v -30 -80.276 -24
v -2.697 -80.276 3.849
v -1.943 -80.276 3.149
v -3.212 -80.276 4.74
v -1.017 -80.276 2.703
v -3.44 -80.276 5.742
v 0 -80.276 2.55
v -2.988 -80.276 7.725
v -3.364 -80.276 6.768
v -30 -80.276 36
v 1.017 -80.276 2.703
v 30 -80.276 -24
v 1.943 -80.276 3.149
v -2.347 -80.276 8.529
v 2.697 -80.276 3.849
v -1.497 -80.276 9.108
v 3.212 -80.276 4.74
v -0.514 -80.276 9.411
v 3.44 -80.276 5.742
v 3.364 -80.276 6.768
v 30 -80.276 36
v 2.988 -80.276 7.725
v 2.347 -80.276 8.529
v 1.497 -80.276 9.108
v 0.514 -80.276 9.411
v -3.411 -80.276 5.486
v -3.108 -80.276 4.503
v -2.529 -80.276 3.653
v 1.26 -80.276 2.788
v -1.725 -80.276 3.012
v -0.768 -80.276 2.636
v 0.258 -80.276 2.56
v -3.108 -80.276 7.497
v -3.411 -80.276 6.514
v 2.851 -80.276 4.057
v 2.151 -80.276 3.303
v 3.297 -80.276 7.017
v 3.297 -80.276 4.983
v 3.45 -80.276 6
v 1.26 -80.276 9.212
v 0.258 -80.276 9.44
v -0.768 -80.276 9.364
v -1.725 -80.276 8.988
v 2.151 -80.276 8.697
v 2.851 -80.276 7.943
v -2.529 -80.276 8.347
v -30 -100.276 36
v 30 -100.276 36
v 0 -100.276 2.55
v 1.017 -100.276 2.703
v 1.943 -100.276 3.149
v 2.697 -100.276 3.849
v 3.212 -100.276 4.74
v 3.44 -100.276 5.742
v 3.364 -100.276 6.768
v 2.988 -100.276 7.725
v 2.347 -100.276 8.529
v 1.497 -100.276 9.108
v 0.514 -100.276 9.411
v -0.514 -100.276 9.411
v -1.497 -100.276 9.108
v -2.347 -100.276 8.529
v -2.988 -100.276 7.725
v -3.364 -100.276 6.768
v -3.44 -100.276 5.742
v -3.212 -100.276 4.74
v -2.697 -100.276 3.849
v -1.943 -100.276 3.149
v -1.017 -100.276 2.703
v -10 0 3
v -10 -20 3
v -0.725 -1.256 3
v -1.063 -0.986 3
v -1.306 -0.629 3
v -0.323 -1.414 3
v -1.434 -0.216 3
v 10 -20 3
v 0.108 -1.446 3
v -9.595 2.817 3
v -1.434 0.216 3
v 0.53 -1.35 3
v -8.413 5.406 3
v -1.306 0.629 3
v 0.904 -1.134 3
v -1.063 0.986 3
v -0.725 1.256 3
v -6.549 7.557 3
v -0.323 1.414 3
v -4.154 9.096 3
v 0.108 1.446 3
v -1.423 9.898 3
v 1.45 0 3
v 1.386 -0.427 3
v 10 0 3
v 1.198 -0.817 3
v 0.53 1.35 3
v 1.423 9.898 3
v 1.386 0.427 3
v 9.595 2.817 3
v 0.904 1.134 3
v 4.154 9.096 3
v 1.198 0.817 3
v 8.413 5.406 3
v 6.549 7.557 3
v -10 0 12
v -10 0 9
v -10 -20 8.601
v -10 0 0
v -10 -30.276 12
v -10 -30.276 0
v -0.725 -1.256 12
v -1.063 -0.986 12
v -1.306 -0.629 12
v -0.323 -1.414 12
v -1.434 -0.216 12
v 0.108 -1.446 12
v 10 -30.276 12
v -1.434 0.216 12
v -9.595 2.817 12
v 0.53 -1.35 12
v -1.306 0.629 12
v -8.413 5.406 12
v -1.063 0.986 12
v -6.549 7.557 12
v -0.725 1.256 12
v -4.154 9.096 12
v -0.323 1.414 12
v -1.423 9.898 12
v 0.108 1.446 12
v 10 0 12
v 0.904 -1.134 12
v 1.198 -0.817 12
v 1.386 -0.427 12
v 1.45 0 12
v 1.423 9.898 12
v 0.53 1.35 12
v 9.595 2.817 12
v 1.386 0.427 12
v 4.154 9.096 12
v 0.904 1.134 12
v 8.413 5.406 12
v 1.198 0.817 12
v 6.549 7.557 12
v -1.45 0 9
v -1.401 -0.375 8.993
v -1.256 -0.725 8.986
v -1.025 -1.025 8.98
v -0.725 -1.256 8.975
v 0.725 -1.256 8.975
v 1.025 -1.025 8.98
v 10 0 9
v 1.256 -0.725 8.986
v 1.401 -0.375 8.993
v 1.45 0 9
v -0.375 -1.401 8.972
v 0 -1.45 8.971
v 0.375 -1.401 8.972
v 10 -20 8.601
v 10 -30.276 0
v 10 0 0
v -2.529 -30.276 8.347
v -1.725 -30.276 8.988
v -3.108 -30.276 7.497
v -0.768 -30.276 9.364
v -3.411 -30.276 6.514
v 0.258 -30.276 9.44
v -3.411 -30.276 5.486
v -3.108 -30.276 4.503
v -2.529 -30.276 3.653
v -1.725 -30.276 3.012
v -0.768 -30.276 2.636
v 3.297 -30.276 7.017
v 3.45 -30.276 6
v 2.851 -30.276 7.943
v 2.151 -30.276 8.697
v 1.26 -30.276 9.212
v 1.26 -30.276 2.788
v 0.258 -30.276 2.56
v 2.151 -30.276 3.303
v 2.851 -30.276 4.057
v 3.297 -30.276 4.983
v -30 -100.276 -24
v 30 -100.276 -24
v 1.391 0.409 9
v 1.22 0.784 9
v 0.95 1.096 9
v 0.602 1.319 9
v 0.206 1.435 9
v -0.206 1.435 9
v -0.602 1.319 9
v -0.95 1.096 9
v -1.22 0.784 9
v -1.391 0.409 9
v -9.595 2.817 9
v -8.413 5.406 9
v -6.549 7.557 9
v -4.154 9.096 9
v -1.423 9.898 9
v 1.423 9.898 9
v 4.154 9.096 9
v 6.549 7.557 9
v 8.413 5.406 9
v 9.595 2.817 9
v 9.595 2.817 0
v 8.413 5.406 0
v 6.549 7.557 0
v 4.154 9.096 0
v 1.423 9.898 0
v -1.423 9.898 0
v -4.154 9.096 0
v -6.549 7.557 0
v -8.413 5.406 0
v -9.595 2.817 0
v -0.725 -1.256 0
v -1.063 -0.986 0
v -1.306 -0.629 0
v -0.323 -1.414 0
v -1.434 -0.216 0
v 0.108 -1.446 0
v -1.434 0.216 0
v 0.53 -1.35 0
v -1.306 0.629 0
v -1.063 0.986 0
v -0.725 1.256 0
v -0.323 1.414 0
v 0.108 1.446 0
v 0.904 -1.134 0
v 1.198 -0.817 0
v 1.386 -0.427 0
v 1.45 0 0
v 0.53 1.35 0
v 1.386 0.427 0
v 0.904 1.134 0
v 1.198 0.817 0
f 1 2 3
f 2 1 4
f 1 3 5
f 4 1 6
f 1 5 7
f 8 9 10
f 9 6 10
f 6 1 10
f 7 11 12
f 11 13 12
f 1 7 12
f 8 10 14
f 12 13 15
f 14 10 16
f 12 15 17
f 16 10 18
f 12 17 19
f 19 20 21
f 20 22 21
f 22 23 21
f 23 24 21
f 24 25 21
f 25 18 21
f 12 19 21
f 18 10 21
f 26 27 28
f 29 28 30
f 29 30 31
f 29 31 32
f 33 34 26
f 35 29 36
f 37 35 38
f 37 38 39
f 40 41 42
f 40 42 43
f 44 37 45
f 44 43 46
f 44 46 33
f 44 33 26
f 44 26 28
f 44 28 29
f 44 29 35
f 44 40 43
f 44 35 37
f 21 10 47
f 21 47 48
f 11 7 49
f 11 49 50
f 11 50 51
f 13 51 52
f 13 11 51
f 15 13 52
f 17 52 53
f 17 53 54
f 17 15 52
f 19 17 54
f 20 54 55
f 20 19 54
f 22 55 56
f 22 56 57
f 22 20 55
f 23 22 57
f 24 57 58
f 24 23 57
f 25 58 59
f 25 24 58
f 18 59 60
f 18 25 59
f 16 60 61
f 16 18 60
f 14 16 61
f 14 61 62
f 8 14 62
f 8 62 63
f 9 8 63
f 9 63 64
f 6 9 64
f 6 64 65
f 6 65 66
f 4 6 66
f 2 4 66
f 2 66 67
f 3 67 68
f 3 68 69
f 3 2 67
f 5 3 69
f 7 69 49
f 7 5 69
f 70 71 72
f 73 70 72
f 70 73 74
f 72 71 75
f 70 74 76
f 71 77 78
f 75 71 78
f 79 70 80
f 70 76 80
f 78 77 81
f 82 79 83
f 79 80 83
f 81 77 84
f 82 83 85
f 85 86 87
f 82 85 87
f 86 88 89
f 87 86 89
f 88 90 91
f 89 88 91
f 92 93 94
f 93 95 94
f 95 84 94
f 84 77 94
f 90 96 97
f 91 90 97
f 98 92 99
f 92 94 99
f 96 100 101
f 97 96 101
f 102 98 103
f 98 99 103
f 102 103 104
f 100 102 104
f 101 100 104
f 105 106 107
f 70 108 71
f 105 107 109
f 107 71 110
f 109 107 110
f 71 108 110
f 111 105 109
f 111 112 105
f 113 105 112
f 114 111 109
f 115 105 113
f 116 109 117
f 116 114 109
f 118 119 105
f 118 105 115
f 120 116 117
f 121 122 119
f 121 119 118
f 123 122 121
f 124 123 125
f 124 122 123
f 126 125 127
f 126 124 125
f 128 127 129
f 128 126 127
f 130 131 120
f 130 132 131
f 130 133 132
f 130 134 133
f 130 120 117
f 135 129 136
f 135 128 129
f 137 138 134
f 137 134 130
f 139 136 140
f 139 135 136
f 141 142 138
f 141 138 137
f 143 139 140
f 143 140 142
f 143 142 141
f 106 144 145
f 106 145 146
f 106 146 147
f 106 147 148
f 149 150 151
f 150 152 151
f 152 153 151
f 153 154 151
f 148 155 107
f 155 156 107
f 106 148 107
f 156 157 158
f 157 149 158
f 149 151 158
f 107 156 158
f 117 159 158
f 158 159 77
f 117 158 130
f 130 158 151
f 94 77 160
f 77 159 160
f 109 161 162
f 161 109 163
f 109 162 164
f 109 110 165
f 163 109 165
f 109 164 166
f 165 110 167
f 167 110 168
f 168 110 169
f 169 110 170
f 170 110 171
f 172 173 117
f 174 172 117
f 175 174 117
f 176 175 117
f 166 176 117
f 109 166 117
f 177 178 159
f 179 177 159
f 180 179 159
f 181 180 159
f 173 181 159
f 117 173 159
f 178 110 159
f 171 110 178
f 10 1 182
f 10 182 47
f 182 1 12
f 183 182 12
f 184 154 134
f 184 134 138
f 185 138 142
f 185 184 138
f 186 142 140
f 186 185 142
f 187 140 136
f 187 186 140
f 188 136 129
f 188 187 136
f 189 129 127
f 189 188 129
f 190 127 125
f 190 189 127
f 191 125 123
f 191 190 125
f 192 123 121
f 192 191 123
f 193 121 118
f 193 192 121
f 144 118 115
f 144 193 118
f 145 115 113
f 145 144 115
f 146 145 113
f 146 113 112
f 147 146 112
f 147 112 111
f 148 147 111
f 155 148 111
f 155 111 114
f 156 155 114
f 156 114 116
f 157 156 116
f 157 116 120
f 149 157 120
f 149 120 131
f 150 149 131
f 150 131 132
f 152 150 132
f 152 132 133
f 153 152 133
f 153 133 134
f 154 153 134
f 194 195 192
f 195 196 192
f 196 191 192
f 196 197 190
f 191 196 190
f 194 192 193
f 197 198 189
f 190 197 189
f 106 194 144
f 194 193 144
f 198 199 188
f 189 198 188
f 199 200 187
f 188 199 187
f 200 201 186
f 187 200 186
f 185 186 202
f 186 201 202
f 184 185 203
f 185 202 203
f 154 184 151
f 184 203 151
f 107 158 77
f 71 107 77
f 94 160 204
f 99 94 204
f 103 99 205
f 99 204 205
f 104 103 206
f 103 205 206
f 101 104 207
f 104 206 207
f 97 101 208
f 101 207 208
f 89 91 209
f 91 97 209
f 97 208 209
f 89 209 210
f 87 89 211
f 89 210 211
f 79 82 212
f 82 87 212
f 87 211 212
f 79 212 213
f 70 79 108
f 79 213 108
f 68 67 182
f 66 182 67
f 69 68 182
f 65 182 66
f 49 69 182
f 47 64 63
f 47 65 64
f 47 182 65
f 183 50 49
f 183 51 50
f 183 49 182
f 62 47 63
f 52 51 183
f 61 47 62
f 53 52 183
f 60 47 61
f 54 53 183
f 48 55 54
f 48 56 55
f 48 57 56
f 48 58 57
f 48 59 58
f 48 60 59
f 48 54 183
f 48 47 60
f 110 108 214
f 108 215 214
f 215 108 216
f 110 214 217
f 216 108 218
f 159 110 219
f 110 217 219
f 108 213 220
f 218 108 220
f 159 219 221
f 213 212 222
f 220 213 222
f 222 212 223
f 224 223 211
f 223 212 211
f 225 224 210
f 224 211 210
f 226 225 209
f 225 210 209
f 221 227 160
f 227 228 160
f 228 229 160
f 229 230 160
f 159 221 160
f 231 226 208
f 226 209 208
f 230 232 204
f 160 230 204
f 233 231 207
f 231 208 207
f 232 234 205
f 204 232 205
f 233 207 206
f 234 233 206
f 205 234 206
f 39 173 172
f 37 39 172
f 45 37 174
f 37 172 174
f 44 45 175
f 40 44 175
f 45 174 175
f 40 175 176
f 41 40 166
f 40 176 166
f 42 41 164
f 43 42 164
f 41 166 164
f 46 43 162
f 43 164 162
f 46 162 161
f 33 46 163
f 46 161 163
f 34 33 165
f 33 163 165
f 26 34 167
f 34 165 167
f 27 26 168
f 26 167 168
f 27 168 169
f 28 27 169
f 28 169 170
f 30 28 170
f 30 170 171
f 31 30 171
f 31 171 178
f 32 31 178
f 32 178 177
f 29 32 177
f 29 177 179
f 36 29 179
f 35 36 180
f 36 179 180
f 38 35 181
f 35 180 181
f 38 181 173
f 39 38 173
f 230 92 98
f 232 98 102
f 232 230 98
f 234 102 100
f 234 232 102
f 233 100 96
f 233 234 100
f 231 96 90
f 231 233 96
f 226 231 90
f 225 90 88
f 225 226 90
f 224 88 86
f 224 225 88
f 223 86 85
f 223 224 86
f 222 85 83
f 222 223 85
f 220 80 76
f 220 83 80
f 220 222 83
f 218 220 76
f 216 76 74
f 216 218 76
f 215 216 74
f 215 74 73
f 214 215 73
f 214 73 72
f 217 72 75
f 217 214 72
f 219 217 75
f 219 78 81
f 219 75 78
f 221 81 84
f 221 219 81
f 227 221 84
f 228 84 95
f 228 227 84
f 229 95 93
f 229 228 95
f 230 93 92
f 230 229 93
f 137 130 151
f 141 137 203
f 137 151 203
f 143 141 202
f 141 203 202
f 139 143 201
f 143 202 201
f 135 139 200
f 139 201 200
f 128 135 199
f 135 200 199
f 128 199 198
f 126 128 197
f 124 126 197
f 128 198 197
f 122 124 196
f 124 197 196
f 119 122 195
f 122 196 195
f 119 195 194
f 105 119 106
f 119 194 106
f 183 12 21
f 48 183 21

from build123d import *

# Parameters (mm, degrees)
SKETCH_1_R          = 1.45
EXTRUDE_1_DEPTH     = 12
CUT_EXTRUDE_1_DEPTH = 39.218600963
EXTRUDE_2_DEPTH     = 50
SKETCH_4_W          = 60
SKETCH_4_H          = 60
SKETCH_4_R          = 3.45
EXTRUDE_3_DEPTH     = 20


with BuildPart() as part:
    # 草圖1 → 填料-伸長1 (new body)
    with BuildSketch(Plane.XY):
        with BuildLine():
            Line((-10, 0), (-10, -30.276417548))
            Line((-10, -30.276417548), (10, -30.276417548))
            Line((10, -30.276417548), (10, 0))
            ThreePointArc((10, 0), (0, 10), (-10, 0))
        make_face()
        Circle(SKETCH_1_R, mode=Mode.SUBTRACT)
    extrude(amount=EXTRUDE_1_DEPTH)

    # 草圖2 → 除料-伸長1 (cut, through all)
    with BuildSketch(Plane(origin=(10, 0, 0), x_dir=(0, 0, -1), z_dir=(1, 0, 0))):
        Polygon((-9, 0), (-6, 0), (-3, 0), (-3, 15.780779257), (-9, 15.780779257), align=None)
        Polygon((-3, 0), (-6, 0), (-9, 0), (-8.60053373, -20), (-3, -20), align=None)
    extrude(amount=-CUT_EXTRUDE_1_DEPTH, mode=Mode.SUBTRACT)

    # 草圖3 → 填料-伸長2 (add)
    with BuildSketch(Plane.XZ.offset(30.276417548)):
        with BuildLine():
            ThreePointArc((-3.45, 6), (0, 2.55), (3.45, 6))
            Line((3.45, 6), (-3.45, 6))
        make_face()
        with BuildLine():
            Line((-3.45, 6), (3.45, 6))
            ThreePointArc((3.45, 6), (0, 9.45), (-3.45, 6))
        make_face()
    extrude(amount=EXTRUDE_2_DEPTH)


with BuildPart() as body_2:
    # 草圖4 → 填料-伸長3 (new body)
    with BuildSketch(Plane.XZ.offset(80.276417548)):
        with Locations((0, 6)):
            Rectangle(SKETCH_4_W, SKETCH_4_H)
        with Locations(Location((0, 6, 0), (0, 0, 270))):
            Circle(SKETCH_4_R, mode=Mode.SUBTRACT)
    extrude(amount=EXTRUDE_3_DEPTH)


solid = Compound([part.part, body_2.part])
